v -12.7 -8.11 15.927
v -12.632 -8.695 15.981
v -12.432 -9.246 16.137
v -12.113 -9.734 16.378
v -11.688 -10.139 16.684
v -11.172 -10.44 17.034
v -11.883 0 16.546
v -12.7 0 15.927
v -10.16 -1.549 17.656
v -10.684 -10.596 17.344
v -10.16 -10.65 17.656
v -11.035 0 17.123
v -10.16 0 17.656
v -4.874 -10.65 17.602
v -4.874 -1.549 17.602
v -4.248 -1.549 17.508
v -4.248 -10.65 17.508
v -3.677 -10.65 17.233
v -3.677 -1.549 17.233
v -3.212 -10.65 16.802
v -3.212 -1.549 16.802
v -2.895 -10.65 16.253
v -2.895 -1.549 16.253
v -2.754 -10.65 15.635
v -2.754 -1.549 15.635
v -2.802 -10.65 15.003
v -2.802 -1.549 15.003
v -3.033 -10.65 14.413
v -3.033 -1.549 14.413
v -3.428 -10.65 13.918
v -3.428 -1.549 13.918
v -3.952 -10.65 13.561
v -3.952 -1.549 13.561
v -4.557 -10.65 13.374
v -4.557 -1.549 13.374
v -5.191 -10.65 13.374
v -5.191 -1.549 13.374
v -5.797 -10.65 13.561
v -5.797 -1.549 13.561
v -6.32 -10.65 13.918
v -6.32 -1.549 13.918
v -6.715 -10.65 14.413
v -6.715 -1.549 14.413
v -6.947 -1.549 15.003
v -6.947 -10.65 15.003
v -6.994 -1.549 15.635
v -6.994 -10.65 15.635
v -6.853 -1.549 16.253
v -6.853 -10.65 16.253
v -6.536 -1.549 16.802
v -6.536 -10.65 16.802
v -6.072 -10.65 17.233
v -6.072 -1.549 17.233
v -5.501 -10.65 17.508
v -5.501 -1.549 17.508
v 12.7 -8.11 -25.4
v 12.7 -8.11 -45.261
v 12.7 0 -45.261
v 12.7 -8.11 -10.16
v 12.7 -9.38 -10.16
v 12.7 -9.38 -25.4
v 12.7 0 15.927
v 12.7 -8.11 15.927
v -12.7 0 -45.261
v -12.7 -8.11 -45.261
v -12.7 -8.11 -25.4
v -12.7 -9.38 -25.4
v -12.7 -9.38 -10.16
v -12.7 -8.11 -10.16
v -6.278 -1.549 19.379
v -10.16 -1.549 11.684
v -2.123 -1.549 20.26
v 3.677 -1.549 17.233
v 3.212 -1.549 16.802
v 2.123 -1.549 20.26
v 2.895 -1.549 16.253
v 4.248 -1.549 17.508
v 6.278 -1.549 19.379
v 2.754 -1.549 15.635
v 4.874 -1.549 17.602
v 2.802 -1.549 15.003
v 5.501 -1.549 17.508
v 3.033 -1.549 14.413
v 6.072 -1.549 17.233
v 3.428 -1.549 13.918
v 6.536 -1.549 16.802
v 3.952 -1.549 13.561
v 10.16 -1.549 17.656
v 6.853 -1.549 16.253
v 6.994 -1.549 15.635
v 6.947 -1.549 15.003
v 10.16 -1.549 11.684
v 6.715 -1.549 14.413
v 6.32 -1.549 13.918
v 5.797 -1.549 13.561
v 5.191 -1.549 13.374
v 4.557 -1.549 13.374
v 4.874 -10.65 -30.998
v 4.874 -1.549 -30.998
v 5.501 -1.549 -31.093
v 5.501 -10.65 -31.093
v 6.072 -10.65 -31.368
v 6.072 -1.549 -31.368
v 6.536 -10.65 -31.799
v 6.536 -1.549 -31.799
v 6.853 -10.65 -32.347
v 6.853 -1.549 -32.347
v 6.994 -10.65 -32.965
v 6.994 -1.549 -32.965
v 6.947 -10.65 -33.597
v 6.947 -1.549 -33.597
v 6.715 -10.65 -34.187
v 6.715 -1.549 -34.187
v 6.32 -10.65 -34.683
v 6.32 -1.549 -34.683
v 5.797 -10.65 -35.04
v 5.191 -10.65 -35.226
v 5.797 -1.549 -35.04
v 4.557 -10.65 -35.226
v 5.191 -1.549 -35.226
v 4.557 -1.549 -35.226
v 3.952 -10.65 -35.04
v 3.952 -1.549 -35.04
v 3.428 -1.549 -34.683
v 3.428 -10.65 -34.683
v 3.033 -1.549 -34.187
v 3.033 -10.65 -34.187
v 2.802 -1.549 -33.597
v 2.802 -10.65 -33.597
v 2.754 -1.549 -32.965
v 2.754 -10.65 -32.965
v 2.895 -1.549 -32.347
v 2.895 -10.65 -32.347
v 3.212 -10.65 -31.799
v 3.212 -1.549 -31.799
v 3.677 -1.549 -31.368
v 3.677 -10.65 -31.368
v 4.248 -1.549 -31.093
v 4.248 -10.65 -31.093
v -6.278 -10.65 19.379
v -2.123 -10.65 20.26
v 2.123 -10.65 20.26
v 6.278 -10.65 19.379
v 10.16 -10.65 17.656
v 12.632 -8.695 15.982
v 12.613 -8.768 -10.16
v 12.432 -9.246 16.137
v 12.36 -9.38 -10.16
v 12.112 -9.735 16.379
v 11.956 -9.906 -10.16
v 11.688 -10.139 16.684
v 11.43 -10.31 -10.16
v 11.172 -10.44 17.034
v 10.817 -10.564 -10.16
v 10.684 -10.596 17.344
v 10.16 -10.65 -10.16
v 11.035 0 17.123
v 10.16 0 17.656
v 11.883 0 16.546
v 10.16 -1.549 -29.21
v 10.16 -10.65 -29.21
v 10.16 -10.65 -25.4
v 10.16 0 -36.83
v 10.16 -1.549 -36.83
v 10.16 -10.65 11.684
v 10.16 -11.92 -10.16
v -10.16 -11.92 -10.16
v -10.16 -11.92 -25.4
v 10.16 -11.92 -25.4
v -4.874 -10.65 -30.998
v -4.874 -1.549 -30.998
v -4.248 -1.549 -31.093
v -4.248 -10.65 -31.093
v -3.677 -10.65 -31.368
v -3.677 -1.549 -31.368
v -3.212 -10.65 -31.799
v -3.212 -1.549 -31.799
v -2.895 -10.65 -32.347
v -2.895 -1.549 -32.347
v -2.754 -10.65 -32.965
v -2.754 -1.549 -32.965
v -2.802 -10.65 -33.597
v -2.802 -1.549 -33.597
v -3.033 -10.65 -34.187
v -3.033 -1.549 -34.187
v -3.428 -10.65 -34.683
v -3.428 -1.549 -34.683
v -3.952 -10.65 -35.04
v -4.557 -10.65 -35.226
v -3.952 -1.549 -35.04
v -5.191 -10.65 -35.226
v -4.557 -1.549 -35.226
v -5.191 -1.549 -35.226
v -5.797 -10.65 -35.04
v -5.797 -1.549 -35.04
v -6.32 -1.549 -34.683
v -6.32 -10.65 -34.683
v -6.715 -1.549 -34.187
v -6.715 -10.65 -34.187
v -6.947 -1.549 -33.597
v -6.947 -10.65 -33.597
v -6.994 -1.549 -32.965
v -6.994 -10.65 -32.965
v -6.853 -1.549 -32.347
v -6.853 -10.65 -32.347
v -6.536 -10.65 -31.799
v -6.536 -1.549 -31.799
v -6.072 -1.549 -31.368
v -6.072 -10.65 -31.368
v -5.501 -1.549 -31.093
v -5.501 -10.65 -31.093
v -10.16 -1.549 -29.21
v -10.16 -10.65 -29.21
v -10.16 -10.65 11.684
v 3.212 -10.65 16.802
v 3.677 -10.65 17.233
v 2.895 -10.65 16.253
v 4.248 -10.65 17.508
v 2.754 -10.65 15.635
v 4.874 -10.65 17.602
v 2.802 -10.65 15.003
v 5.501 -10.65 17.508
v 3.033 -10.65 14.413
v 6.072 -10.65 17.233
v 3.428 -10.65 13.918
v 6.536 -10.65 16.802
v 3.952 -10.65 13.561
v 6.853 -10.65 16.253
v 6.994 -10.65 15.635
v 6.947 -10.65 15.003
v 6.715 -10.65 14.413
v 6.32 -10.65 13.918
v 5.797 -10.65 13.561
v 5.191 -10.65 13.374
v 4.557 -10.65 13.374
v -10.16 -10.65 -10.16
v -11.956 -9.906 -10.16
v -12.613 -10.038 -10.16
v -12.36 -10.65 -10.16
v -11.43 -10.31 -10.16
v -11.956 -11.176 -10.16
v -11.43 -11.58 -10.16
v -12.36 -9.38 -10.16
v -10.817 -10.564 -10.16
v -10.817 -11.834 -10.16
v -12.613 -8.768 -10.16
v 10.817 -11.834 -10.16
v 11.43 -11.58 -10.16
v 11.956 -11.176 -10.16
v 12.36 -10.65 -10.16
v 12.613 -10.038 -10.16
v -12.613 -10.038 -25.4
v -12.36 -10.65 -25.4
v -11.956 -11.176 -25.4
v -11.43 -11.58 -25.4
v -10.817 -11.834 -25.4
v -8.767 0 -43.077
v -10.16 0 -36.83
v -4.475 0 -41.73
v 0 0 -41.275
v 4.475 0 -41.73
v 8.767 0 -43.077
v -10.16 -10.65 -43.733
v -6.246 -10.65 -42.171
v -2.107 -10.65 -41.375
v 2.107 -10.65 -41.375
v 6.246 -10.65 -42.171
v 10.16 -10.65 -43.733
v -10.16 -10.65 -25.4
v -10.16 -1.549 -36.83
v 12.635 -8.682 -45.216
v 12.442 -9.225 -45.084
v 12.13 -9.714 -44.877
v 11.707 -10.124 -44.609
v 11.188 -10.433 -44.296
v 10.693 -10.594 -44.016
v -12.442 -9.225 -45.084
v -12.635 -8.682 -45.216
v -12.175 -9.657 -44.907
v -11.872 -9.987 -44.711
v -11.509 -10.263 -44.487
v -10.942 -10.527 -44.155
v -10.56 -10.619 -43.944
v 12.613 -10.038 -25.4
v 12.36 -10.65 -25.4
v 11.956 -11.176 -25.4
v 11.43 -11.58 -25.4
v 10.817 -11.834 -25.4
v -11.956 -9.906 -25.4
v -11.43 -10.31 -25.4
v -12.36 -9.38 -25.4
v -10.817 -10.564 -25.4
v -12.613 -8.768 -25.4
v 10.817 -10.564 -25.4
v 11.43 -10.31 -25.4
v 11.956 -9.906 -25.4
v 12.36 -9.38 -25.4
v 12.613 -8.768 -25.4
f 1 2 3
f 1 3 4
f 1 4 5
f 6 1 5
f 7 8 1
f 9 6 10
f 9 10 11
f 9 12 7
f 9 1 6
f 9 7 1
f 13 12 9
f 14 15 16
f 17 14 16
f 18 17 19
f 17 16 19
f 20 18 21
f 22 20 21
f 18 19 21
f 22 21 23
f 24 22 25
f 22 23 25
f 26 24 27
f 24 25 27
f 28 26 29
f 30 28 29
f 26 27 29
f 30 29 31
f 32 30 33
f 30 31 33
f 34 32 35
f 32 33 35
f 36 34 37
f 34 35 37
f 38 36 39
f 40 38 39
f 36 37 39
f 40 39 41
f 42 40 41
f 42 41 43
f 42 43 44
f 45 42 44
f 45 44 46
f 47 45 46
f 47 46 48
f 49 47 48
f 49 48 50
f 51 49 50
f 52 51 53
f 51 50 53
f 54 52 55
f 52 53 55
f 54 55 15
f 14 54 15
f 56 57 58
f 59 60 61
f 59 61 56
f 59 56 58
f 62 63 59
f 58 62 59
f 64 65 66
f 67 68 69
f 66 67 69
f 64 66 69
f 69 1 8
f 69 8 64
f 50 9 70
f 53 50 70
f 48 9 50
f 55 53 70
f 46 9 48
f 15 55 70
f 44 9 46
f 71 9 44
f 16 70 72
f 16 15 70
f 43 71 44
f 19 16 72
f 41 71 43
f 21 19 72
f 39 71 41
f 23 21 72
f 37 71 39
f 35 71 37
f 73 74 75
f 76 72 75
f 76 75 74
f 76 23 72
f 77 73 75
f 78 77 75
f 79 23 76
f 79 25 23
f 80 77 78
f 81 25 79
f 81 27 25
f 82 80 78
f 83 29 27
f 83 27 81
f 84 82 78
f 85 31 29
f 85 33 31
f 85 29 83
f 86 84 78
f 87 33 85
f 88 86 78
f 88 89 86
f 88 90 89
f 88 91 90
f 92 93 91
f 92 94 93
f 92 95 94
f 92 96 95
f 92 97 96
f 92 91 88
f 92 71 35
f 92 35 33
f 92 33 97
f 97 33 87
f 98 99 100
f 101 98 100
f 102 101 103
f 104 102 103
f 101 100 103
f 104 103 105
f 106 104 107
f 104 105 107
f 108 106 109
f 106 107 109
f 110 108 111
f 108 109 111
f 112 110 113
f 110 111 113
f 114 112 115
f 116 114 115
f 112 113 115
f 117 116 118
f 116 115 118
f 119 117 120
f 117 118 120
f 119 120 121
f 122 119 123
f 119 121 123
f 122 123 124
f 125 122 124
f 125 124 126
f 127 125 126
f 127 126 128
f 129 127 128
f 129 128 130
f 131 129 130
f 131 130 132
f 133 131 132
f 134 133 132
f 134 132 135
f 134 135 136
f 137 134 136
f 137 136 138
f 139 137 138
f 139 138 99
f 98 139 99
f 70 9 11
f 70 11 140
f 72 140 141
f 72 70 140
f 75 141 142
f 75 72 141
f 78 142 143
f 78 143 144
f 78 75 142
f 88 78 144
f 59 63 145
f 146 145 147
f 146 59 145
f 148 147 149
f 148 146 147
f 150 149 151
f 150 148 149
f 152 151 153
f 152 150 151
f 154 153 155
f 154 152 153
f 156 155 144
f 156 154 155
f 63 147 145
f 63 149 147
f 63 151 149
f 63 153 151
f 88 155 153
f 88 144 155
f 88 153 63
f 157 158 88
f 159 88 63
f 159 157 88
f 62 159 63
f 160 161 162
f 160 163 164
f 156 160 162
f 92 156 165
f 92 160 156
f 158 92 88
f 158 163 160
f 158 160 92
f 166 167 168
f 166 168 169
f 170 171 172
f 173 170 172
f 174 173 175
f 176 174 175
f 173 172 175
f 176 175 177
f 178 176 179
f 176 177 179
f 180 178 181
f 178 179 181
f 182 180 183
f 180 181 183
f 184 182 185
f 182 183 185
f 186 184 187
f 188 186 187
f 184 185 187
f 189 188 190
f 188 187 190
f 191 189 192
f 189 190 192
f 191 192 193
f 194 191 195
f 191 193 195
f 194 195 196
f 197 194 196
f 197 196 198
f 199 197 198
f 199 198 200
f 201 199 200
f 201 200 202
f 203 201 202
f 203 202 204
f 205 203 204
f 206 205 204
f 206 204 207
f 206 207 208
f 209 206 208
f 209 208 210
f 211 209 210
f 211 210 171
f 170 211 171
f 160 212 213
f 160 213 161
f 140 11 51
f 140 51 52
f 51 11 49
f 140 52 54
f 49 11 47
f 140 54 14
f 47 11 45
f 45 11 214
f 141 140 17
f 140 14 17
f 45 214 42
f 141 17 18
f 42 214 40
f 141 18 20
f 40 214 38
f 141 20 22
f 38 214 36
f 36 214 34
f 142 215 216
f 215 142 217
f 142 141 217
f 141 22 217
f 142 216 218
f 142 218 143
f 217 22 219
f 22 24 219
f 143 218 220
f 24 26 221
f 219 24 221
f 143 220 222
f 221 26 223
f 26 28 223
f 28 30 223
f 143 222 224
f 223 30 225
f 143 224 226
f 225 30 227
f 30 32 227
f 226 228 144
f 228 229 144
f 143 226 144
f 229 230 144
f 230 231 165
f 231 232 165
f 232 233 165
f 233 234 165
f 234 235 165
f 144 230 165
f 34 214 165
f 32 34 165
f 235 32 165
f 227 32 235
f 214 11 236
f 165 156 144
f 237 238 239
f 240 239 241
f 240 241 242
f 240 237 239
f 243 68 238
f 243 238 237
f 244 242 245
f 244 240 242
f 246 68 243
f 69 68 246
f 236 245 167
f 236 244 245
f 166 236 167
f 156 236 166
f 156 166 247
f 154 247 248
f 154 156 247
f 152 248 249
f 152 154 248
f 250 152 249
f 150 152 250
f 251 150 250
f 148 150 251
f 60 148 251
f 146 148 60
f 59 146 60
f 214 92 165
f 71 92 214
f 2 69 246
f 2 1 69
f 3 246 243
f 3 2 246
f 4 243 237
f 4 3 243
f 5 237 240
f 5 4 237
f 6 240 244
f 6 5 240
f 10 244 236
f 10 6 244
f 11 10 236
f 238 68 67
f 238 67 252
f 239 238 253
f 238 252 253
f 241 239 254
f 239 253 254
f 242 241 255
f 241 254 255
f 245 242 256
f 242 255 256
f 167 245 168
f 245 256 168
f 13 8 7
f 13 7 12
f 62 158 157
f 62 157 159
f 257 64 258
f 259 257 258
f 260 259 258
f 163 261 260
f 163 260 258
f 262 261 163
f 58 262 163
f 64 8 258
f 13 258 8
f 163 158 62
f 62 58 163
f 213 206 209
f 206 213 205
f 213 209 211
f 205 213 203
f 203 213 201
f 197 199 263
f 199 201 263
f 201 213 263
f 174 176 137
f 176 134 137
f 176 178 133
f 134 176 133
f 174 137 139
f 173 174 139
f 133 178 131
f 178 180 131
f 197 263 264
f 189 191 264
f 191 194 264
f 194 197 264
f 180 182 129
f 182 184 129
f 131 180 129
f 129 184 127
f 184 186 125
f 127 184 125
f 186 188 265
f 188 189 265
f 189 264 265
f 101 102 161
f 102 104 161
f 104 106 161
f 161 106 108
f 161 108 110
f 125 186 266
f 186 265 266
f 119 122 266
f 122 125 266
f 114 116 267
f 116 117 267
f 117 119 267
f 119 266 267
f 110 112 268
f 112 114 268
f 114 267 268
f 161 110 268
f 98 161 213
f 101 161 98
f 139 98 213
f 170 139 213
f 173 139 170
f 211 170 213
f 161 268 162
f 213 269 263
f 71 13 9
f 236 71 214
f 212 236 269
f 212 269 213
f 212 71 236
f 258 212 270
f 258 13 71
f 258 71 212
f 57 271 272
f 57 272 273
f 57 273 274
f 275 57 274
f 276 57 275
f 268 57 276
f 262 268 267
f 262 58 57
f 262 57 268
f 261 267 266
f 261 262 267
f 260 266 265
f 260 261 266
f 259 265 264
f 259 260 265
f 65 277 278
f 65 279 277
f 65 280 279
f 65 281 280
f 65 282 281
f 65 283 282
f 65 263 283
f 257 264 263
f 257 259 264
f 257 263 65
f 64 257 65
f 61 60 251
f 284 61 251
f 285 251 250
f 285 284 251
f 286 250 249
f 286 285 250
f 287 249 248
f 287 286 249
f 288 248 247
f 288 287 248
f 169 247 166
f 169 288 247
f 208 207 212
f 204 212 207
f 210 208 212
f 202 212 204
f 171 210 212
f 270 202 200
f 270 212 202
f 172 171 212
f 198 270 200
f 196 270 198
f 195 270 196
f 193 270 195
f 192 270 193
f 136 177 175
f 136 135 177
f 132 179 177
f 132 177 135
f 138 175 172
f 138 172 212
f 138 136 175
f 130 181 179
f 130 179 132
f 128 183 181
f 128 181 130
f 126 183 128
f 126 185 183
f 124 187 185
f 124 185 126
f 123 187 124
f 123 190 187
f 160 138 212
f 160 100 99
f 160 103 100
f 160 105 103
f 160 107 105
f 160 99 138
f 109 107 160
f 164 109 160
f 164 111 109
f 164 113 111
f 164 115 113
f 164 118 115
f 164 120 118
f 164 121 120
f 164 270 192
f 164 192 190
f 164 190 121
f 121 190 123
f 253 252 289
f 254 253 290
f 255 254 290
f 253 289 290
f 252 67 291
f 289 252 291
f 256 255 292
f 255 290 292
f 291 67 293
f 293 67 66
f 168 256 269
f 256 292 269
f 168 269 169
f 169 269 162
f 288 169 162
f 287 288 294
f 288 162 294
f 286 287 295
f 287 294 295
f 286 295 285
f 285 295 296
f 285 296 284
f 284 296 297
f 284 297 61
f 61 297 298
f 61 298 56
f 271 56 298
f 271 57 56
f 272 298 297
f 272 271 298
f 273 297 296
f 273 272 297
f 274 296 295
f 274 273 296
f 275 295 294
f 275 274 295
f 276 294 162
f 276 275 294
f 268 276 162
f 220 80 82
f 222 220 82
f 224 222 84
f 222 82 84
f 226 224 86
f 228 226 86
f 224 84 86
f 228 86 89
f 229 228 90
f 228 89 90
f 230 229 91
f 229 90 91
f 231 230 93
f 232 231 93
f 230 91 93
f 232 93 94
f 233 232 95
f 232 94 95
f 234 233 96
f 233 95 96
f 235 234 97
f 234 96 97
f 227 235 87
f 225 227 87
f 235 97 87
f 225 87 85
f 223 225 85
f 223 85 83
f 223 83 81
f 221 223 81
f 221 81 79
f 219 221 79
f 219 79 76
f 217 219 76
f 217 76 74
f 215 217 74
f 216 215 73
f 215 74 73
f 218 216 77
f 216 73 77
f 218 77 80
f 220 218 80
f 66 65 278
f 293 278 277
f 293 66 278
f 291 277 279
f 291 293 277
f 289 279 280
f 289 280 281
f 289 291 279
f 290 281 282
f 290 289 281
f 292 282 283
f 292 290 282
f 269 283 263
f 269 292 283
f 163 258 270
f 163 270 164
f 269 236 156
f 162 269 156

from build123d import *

# Parameters (mm, degrees)
BOSS_EXTRUDE1_DEPTH = 10.65022
SKETCH3_W           = 20.32
SKETCH3_H           = 7.62
CUT_EXTRUDE1_DEPTH  = 1.5494
SKETCH4_R           = 2.12598
CUT_EXTRUDE2_DEPTH  = 19.3294
SKETCH5_R           = 2.12598
BOSS_EXTRUDE2_DEPTH = 9.10082
SKETCH6_W           = 25.4
SKETCH6_H           = 1.27
BOSS_EXTRUDE3_DEPTH = 15.24
FILLET1_R           = 2.54
FILLET2_R           = 2.54


with BuildPart() as part:
    # Sketch2 → Boss-Extrude1 (new body)
    with BuildSketch(Plane(origin=(0, 0, 0), x_dir=(1, 0, 0), z_dir=(0, 1, 0))):
        with BuildLine():
            Line((-12.7, 45.261013597), (-12.7, -15.927319066))
            ThreePointArc((-12.7, -15.927319066), (-11.462644476, -16.839752797), (-10.16, -17.656270632))
            Line((-10.16, -17.656270632), (-10.16, 29.21))
            Line((-10.16, 29.21), (10.16, 29.21))
            Line((10.16, 29.21), (10.16, -17.656270632))
            ThreePointArc((10.16, -17.656270632), (11.462644476, -16.839752797), (12.7, -15.927319066))
            Line((12.7, -15.927319066), (12.7, 45.261013597))
            ThreePointArc((12.7, 45.261013597), (0, 41.275), (-12.7, 45.261013597))
        make_face()
    extrude(amount=-BOSS_EXTRUDE1_DEPTH)

    # Sketch3 → Cut-Extrude1 (cut)
    with BuildSketch(Plane(origin=(0, 0, 0), x_dir=(1, 0, 0), z_dir=(0, 1, 0))):
        with Locations((0, 33.02)):
            Rectangle(SKETCH3_W, SKETCH3_H)
    extrude(amount=-CUT_EXTRUDE1_DEPTH, mode=Mode.SUBTRACT)

    # Sketch4 → Cut-Extrude2 (cut)
    with BuildSketch(Plane(origin=(0, -1.5494, 0), x_dir=(1, 0, 0), z_dir=(0, 1, 0))):
        with Locations(Location((-4.87426, 33.12414, 0), (0, 0, 270))):
            Circle(SKETCH4_R)
        with Locations(Location((4.87426, 33.12414, 0), (0, 0, 270))):
            Circle(SKETCH4_R)
    extrude(amount=-CUT_EXTRUDE2_DEPTH, mode=Mode.SUBTRACT)

    # Sketch5 → Boss-Extrude2 (add)
    with BuildSketch(Plane(origin=(0, -1.5494, 0), x_dir=(1, 0, 0), z_dir=(0, 1, 0))):
        with BuildLine():
            Line((10.16, -11.684), (-10.16, -11.684))
            Line((-10.16, -11.684), (-10.16, -17.656270632))
            ThreePointArc((-10.16, -17.656270632), (0, -20.3708), (10.16, -17.656270632))
            Line((10.16, -17.656270632), (10.16, -11.684))
        make_face()
        with Locations(Location((4.87426, -15.47622, 0), (0, 0, 270))):
            Circle(SKETCH5_R, mode=Mode.SUBTRACT)
        with Locations(Location((-4.87426, -15.47622, 0), (0, 0, 270))):
            Circle(SKETCH5_R, mode=Mode.SUBTRACT)
    extrude(amount=-BOSS_EXTRUDE2_DEPTH)

    # Sketch6 → Boss-Extrude3 (add)
    with BuildSketch(Plane.XY.offset(-10.16)):
        with Locations((0, -11.28522)):
            Rectangle(SKETCH6_W, SKETCH6_H)
    extrude(amount=-BOSS_EXTRUDE3_DEPTH)

    # Fillet1
    fillet1_edges = [part.edges().sort_by_distance(p)[0] for p in [
        (12.7, -10.65022, 2.883659533),
        (-12.7, -10.65022, 2.883659533),
        (-12.7, -10.65022, -35.330506799),
        (12.7, -10.65022, -35.330506799),
    ]]
    fillet(fillet1_edges, radius=FILLET1_R - 0.0001)  # a hair under: the kernel refuses the full size

    # Fillet2
    fillet2_edges = [part.edges().sort_by_distance(p)[0] for p in [
        (-12.7, -11.92022, -17.78),
        (12.7, -11.92022, -17.78),
    ]]
    fillet(fillet2_edges, radius=FILLET2_R)


solid = part.part
